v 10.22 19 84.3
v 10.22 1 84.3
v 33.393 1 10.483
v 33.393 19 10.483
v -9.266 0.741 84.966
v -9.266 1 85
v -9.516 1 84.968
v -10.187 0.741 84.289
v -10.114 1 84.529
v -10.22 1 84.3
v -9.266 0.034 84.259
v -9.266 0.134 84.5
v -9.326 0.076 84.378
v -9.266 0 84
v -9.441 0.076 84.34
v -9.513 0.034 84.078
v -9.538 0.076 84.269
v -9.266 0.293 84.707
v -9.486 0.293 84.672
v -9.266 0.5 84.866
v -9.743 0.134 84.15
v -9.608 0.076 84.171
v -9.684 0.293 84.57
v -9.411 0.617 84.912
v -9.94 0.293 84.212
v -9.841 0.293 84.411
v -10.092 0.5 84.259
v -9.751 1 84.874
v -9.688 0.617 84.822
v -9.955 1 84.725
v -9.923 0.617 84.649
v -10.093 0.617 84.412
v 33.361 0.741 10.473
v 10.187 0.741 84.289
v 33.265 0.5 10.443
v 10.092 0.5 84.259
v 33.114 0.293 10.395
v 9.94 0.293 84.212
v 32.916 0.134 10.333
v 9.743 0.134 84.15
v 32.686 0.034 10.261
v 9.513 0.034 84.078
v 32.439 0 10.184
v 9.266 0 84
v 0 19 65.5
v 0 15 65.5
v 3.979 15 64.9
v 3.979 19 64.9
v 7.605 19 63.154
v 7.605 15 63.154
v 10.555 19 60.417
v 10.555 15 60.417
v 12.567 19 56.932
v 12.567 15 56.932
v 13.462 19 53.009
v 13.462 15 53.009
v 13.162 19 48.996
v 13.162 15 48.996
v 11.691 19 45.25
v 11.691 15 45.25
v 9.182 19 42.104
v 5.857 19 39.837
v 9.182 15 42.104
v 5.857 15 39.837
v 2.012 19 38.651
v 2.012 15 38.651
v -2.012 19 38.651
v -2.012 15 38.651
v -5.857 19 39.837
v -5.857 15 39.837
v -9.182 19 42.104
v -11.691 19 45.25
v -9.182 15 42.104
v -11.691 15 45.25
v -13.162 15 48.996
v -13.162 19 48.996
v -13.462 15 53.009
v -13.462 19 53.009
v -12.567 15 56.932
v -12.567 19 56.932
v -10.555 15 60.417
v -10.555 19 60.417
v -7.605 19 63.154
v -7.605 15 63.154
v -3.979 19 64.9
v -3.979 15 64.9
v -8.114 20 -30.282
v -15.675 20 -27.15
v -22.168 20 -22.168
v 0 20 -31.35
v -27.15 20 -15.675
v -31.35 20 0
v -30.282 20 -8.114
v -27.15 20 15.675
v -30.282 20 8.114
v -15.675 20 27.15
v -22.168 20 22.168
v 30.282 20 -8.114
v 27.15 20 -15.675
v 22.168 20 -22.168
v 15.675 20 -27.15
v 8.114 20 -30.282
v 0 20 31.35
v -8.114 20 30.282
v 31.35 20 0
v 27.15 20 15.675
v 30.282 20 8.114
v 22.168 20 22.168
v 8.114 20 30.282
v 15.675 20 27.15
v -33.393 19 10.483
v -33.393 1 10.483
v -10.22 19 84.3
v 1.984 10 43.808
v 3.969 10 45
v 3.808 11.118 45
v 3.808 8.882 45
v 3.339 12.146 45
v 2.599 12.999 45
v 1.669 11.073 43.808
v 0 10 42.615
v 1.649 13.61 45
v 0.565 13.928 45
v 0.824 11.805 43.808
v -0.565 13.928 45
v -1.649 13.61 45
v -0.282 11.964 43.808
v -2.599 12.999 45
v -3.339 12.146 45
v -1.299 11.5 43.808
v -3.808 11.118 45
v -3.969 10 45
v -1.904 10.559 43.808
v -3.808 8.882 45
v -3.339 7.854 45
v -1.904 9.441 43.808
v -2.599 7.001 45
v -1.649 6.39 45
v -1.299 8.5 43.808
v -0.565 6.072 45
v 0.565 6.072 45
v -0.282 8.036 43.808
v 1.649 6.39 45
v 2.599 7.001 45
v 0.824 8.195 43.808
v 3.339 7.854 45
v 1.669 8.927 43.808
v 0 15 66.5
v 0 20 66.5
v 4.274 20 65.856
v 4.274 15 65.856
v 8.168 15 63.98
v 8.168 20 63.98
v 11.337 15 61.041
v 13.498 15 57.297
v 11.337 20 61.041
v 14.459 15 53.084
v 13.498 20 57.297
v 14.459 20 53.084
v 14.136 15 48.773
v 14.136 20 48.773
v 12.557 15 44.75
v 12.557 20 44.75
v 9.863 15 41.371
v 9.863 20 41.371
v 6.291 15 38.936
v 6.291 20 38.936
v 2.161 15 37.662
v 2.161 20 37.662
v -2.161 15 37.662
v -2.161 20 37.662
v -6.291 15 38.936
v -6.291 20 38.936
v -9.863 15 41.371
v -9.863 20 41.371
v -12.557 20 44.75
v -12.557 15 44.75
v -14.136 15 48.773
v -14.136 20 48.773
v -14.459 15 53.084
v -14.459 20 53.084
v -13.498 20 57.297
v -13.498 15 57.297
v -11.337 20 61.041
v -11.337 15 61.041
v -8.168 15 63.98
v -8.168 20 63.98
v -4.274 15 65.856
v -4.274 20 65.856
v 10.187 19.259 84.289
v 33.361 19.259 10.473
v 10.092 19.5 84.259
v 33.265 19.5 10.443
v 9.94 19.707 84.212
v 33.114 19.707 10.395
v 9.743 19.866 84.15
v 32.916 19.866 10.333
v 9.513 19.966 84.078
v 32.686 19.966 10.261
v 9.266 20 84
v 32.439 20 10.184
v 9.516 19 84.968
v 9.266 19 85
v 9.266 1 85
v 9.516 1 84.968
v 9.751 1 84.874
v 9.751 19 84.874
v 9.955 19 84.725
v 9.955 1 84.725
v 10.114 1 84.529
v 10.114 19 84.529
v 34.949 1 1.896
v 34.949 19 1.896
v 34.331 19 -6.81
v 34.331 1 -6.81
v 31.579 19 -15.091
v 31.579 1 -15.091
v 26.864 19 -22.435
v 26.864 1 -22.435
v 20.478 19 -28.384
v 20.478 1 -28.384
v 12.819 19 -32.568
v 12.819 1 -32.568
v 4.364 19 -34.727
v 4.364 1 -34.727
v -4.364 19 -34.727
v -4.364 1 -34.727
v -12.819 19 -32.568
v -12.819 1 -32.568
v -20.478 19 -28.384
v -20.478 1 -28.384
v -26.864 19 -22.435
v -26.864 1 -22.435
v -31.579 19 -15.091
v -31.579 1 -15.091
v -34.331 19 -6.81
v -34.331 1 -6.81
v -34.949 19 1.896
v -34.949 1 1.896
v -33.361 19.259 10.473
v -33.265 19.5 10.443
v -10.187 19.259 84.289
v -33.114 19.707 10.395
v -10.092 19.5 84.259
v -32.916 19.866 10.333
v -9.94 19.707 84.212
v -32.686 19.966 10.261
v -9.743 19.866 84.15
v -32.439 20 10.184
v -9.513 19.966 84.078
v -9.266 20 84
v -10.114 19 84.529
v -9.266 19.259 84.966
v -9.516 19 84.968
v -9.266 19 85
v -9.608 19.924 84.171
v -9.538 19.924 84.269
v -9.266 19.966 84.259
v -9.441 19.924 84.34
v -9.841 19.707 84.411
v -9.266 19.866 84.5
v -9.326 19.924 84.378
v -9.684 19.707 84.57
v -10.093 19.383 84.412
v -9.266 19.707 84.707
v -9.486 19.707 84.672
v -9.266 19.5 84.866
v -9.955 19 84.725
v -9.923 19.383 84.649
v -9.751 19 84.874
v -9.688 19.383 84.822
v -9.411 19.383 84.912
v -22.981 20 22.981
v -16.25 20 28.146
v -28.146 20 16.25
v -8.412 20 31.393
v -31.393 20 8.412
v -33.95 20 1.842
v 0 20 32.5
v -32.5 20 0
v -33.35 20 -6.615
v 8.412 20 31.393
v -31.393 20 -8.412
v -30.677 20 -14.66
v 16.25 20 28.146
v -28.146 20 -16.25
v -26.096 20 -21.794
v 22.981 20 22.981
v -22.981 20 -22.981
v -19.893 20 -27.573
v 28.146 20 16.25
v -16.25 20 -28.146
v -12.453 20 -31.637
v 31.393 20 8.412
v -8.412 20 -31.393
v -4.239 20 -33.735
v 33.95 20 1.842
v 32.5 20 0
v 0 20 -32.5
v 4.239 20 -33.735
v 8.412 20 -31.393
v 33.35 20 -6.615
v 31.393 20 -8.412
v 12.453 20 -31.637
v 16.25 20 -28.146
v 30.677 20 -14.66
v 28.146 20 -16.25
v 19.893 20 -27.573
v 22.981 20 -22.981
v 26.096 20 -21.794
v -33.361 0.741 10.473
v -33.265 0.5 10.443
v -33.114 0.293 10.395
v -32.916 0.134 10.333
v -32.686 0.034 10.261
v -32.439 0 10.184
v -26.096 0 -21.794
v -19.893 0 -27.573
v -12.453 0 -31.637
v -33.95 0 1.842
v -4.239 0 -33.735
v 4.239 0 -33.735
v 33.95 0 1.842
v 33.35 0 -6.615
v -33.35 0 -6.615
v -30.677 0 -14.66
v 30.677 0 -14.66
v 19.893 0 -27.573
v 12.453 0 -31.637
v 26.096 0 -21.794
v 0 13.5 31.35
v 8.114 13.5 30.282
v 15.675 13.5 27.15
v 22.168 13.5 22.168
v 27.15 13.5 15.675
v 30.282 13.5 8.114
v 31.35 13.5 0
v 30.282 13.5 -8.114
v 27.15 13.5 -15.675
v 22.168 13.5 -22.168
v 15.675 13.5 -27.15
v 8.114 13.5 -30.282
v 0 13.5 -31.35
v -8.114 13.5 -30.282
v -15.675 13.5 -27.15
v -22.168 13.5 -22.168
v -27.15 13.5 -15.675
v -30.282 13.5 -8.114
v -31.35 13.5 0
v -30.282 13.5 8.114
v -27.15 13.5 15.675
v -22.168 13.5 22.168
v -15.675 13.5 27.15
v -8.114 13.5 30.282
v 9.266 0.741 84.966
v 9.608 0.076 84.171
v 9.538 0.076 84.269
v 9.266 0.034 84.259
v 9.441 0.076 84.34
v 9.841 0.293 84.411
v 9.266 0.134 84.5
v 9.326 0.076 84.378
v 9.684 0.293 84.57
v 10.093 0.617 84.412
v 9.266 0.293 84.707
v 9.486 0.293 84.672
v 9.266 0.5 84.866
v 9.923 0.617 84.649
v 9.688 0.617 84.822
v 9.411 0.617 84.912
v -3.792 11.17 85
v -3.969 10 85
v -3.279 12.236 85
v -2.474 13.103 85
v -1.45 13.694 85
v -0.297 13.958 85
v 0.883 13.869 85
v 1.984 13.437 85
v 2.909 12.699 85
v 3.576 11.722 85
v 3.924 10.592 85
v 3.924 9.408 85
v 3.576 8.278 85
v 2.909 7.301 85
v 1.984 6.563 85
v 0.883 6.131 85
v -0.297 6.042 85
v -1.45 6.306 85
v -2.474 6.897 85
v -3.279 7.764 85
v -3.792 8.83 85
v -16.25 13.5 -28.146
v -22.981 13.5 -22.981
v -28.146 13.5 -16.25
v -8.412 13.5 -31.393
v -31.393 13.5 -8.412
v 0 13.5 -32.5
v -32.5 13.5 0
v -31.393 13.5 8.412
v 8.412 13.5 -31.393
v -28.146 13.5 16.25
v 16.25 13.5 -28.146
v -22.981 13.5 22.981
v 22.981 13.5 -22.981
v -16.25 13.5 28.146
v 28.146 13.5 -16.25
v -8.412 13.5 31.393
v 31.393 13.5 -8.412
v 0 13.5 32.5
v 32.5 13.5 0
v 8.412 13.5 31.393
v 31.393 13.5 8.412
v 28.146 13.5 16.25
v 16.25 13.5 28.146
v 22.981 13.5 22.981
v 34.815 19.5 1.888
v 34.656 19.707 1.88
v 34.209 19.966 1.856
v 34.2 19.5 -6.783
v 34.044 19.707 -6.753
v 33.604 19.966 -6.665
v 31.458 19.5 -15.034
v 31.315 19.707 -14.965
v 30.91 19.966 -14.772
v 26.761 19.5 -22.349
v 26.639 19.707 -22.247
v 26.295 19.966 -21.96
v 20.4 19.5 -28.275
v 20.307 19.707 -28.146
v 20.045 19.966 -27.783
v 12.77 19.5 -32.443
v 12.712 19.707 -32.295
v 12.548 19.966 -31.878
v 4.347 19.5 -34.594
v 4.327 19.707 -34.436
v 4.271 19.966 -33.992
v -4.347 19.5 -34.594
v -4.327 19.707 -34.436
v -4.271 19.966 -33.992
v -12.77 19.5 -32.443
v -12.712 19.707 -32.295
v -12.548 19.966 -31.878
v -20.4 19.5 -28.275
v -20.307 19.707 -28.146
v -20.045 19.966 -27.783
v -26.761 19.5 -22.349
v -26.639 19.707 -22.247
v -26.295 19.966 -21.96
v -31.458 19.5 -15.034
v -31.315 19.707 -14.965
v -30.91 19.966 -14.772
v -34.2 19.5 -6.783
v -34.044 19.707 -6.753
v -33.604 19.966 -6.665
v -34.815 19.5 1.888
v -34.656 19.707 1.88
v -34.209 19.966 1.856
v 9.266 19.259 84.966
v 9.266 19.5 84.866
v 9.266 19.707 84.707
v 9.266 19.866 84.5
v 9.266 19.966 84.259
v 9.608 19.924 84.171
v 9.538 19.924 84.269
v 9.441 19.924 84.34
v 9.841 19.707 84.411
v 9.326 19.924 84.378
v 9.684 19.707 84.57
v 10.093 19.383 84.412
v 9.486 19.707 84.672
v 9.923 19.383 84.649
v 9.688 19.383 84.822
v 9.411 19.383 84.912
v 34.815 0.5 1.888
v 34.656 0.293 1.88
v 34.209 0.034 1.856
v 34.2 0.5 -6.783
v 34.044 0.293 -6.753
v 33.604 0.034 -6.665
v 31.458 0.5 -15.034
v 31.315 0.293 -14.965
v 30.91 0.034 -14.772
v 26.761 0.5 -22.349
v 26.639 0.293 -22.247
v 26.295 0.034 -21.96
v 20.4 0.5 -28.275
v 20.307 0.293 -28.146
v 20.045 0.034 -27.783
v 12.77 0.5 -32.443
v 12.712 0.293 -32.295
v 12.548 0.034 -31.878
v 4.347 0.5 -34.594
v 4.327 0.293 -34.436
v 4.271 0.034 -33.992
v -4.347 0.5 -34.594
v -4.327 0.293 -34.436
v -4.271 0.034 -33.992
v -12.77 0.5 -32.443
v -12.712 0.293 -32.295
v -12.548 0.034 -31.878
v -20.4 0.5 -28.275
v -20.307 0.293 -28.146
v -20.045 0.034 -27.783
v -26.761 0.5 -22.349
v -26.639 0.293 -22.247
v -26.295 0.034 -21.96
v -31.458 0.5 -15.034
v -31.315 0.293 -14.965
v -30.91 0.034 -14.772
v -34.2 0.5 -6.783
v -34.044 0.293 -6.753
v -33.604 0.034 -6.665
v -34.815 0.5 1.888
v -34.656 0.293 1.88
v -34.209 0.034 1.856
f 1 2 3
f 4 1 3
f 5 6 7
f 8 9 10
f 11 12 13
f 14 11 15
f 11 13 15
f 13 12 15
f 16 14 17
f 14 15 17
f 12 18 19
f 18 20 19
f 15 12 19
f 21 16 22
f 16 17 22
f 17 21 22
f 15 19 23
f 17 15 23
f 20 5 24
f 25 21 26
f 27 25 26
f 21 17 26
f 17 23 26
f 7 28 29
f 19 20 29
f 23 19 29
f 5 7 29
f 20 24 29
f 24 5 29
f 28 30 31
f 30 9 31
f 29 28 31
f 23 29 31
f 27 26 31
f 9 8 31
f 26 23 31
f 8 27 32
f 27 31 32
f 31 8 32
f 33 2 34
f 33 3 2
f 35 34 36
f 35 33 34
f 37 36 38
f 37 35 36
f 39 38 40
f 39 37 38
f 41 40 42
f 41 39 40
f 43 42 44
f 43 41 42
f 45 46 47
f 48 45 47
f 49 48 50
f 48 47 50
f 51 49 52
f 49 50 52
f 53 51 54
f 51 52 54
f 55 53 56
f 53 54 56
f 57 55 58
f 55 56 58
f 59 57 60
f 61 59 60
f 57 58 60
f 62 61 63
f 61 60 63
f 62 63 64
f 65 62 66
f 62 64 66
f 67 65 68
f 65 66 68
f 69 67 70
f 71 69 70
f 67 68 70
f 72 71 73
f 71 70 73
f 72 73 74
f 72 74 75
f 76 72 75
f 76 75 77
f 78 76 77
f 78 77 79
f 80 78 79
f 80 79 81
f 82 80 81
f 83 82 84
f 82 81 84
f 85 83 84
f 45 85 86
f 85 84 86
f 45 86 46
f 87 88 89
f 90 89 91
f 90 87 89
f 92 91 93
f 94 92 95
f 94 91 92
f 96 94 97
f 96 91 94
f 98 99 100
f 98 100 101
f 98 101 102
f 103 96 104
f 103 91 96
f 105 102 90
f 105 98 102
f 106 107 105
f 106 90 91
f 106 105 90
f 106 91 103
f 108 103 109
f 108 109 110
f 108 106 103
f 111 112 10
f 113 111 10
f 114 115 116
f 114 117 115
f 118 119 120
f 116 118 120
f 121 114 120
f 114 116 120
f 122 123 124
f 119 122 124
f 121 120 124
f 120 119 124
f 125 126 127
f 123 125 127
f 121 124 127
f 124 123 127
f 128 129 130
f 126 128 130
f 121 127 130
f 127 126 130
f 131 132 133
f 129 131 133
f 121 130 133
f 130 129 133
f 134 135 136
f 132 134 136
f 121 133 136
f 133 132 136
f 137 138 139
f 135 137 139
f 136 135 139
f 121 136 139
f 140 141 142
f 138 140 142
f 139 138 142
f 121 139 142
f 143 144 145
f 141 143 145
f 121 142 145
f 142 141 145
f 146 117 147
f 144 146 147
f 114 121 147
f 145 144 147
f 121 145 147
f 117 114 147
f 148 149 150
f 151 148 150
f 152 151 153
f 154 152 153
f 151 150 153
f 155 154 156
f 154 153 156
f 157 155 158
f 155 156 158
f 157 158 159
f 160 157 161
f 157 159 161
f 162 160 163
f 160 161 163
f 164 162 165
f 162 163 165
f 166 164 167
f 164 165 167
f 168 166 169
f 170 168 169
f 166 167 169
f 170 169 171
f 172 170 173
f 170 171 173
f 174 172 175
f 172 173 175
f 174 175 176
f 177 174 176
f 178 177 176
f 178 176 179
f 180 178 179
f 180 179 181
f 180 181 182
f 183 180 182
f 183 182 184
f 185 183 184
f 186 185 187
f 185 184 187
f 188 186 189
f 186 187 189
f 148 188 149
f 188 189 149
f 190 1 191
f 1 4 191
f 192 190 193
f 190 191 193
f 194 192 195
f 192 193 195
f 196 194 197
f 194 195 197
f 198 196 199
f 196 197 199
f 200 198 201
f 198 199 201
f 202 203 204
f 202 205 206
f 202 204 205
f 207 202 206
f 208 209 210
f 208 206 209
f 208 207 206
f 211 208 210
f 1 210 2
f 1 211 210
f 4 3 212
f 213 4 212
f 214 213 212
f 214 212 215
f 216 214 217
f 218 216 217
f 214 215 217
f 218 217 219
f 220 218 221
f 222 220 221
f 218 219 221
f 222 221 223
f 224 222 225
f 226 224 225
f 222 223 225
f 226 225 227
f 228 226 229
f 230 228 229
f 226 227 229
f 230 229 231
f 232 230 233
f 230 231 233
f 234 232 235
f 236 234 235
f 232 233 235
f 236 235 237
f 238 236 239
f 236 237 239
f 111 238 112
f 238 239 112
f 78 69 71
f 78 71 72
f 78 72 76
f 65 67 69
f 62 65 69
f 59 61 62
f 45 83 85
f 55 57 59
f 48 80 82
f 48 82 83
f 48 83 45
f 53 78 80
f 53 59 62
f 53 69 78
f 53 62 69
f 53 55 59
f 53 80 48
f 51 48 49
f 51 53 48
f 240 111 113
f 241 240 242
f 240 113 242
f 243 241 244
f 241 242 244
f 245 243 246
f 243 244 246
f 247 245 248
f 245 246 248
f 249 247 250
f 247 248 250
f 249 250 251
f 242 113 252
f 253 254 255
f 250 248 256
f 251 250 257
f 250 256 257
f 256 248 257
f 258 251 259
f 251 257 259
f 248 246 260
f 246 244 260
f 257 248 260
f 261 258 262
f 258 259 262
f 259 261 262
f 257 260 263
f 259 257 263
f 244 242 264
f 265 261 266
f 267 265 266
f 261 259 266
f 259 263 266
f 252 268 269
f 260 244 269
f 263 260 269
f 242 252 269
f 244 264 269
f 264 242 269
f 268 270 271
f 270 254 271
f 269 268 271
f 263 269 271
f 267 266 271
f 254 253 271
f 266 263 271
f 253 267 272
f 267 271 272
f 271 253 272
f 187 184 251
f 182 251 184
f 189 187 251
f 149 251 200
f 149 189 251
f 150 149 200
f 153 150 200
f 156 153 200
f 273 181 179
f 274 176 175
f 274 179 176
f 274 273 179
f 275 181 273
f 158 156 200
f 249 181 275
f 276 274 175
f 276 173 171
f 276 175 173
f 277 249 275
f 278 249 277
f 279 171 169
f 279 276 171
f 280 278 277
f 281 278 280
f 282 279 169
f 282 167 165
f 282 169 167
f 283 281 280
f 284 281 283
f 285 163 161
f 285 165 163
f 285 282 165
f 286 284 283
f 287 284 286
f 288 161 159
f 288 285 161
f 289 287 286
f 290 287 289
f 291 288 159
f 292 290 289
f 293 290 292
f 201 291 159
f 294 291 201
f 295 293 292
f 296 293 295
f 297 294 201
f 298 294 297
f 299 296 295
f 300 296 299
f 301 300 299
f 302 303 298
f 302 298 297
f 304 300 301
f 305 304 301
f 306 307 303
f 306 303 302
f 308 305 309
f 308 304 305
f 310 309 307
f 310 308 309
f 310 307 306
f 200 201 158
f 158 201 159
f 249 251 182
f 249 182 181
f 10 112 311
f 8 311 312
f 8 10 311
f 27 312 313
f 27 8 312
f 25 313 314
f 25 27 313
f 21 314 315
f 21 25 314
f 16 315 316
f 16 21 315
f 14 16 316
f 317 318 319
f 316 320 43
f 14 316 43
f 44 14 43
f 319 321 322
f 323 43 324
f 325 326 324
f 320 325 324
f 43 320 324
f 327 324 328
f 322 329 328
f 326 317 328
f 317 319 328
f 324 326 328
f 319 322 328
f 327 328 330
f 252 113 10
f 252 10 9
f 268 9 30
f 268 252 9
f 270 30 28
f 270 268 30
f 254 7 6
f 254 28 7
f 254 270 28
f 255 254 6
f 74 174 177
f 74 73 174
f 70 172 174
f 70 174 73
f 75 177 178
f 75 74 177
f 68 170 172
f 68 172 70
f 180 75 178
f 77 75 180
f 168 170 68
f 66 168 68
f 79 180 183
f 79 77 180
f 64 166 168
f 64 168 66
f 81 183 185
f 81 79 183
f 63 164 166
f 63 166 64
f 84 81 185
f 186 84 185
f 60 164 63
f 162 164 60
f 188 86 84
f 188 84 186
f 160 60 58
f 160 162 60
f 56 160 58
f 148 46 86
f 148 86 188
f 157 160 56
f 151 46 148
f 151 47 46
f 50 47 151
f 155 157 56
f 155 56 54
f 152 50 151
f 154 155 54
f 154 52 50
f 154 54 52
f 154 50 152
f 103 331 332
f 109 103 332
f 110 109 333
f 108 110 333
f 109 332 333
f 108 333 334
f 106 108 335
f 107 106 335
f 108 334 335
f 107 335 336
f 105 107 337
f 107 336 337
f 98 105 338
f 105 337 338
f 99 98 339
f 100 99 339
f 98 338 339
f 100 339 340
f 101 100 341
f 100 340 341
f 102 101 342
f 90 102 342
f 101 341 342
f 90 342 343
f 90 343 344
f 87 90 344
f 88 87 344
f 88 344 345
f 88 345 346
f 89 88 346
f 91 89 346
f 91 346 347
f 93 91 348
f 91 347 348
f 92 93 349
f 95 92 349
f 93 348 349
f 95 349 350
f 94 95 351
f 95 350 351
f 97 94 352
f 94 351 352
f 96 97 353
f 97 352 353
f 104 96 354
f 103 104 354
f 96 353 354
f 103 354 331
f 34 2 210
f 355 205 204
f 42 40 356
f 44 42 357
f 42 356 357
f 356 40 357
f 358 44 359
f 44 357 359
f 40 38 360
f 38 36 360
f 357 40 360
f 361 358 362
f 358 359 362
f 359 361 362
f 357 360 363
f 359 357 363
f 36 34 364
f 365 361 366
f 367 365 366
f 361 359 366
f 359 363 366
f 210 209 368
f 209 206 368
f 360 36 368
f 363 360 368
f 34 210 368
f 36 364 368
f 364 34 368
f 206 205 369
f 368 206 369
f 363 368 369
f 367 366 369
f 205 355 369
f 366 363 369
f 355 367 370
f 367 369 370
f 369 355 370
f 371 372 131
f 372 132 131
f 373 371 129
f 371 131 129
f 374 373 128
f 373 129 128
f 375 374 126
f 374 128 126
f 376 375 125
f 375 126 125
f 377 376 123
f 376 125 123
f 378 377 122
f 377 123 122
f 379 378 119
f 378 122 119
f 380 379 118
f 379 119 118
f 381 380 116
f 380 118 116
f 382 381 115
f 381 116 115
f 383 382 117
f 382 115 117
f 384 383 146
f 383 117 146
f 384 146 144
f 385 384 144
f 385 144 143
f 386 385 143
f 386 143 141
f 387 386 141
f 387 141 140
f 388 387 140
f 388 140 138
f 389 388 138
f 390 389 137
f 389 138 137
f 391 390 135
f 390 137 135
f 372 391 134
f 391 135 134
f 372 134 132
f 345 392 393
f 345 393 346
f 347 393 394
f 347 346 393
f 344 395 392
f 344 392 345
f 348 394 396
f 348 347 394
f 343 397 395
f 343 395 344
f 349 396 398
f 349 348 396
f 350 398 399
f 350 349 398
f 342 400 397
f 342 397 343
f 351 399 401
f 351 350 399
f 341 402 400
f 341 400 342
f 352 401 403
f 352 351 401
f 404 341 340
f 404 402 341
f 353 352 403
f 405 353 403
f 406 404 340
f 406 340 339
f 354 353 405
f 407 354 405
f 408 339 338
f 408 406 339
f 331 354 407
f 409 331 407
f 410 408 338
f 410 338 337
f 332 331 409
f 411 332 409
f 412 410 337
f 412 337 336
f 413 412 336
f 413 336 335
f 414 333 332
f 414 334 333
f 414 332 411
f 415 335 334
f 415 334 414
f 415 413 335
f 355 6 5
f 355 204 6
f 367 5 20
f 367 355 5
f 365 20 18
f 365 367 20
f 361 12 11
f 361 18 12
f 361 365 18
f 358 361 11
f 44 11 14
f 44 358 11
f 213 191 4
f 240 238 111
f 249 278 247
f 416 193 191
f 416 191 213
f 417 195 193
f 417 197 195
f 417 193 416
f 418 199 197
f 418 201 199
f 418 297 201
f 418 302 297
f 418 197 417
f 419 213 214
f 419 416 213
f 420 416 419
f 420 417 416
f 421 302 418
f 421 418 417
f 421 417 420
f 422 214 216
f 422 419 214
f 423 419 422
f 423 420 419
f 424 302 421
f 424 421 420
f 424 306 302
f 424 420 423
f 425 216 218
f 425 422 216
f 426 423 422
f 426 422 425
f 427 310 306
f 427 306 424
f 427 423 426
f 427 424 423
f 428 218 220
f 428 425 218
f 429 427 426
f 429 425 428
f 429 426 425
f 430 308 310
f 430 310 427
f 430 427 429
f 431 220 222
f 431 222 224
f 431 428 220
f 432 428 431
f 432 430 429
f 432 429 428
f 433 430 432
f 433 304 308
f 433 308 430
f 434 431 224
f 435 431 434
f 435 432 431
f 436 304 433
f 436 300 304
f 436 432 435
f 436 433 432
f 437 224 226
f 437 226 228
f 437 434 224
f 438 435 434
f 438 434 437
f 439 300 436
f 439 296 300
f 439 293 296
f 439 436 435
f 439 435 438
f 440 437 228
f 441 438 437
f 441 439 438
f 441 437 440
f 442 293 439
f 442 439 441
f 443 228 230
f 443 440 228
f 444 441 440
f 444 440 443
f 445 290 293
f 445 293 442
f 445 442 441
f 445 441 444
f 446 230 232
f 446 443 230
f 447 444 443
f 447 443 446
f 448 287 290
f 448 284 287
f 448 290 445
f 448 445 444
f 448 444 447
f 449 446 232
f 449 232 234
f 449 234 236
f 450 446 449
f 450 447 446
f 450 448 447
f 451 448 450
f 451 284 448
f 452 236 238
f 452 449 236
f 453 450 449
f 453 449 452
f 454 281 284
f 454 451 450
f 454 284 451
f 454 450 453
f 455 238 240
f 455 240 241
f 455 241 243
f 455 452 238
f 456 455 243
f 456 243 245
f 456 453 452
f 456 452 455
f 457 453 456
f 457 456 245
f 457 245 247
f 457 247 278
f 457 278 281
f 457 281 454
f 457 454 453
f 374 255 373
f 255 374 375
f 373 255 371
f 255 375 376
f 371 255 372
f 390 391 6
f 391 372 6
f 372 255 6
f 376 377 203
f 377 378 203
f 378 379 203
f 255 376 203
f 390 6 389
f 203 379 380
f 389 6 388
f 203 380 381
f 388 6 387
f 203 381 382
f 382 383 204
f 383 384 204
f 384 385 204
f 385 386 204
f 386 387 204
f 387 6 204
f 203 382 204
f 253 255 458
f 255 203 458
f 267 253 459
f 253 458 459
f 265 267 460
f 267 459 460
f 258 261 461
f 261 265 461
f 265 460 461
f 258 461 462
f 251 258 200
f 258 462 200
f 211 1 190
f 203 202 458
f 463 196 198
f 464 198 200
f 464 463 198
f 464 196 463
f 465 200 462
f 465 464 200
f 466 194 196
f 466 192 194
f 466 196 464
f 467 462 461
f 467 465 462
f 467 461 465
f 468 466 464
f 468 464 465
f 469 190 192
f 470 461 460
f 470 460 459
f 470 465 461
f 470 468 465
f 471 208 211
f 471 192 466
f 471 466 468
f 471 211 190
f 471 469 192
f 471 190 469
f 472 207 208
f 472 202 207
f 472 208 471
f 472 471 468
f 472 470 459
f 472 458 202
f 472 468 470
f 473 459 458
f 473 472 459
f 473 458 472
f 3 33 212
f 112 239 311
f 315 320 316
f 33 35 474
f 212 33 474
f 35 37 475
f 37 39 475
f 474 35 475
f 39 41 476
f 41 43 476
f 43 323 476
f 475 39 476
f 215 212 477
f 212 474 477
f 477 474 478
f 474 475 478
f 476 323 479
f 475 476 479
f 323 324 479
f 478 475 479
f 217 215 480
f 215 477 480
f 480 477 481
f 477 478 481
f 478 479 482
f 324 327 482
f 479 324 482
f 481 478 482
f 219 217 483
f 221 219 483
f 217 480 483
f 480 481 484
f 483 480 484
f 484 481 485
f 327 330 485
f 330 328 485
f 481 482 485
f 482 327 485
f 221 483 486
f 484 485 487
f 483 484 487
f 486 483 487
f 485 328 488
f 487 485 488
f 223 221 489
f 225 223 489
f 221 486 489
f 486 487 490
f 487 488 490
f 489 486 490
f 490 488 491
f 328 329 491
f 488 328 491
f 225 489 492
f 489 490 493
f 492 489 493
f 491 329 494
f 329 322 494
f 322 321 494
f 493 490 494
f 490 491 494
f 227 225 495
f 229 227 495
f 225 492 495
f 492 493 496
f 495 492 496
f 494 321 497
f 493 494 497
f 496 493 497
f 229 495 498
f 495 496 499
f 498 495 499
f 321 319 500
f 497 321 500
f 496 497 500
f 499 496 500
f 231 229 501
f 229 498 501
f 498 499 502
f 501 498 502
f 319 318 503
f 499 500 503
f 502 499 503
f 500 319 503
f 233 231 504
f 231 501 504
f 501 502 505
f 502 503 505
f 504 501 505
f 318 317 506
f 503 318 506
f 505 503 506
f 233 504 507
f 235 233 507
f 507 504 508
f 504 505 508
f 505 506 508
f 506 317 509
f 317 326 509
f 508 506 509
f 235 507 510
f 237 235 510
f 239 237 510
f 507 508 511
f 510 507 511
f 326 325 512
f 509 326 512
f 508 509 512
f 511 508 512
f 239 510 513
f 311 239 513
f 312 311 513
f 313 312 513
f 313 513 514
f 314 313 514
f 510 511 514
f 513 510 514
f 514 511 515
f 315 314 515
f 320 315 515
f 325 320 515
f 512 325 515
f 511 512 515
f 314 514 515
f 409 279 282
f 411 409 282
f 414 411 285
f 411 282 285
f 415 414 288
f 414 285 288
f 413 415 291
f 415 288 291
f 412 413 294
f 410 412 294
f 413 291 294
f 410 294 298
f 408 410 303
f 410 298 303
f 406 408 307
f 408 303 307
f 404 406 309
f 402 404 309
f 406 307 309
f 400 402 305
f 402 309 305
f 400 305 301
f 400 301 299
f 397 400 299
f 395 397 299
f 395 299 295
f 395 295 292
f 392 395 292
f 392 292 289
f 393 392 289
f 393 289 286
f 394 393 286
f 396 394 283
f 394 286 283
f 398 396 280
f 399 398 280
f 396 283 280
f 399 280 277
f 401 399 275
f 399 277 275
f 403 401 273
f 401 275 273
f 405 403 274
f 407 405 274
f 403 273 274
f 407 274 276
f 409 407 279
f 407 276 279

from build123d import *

# Parameters (mm, degrees)
SKETCH1_R                       = 35
BOSS_EXTRUDE1_DEPTH             = 20
SKETCH2_R                       = 32.5
CUT_EXTRUDE1_DEPTH              = 6.5
SKETCH3_R                       = 31.35
BOSS_EXTRUDE2_DEPTH             = 6.5
BOSS_EXTRUDE3_DEPTH             = 20
SKETCH14_R                      = 14.5
CUT_EXTRUDE2_DEPTH              = 5
SKETCH15_R                      = 13.5
BOSS_EXTRUDE4_DEPTH             = 4
TAP_DRILL_FOR_3_8_16_TAP1_D     = 7.9375
TAP_DRILL_FOR_3_8_16_TAP1_DEPTH = 40
TAP_DRILL_FOR_3_8_16_TAP1_TIP   = 2.384665582
FILLET1_R                       = 1


with BuildPart() as part:
    # Sketch1 → Boss-Extrude1 (new body)
    with BuildSketch(Plane(origin=(0, 0, 0), x_dir=(1, 0, 0), z_dir=(0, 1, 0))):
        with Locations(Location((0, 0, 0), (0, 0, 270))):
            Circle(SKETCH1_R)
    extrude(amount=BOSS_EXTRUDE1_DEPTH)

    # Sketch2 → Cut-Extrude1 (cut)
    with BuildSketch(Plane(origin=(0, 20, 0), x_dir=(1, 0, 0), z_dir=(0, 1, 0))):
        with Locations(Location((0, 0, 0), (0, 0, 270))):
            Circle(SKETCH2_R)
    extrude(amount=-CUT_EXTRUDE1_DEPTH, mode=Mode.SUBTRACT)

    # Sketch3 → Boss-Extrude2 (add)
    with BuildSketch(Plane(origin=(0, 13.5, 0), x_dir=(1, 0, 0), z_dir=(0, 1, 0))):
        with Locations(Location((0, 0, 0), (0, 0, 270))):
            Circle(SKETCH3_R)
    extrude(amount=BOSS_EXTRUDE2_DEPTH)

    # Sketch8 → Boss-Extrude3 (add)
    with BuildSketch(Plane(origin=(0, 0, 0), x_dir=(1, 0, 0), z_dir=(0, 1, 0))):
        with BuildLine():
            ThreePointArc((33.393164213, -10.483157151), (0, -35), (-33.393164213, -10.483157151))
            Line((-33.393164213, -10.483157151), (-10, -85))
            Line((-10, -85), (10, -85))
            Line((10, -85), (33.393164213, -10.483157151))
        make_face()
    extrude(amount=BOSS_EXTRUDE3_DEPTH)

    # Sketch14 → Cut-Extrude2 (cut)
    with BuildSketch(Plane(origin=(0, 20, 0), x_dir=(1, 0, 0), z_dir=(0, 1, 0))):
        with Locations(Location((0, -52, 0), (0, 0, 270))):
            Circle(SKETCH14_R)
    extrude(amount=-CUT_EXTRUDE2_DEPTH, mode=Mode.SUBTRACT)

    # Sketch15 → Boss-Extrude4 (add)
    with BuildSketch(Plane(origin=(0, 15, 0), x_dir=(1, 0, 0), z_dir=(0, 1, 0))):
        with Locations(Location((0, -52, 0), (0, 0, 270))):
            Circle(SKETCH15_R)
    extrude(amount=BOSS_EXTRUDE4_DEPTH)

    # Tap Drill for 3/8-16 Tap1
    with Locations(Plane.XY.offset(85)):
        with Locations((0, 10)):
            Hole(TAP_DRILL_FOR_3_8_16_TAP1_D / 2, depth=TAP_DRILL_FOR_3_8_16_TAP1_DEPTH)
            with Locations((0, 0, -(TAP_DRILL_FOR_3_8_16_TAP1_DEPTH + TAP_DRILL_FOR_3_8_16_TAP1_TIP / 2))):  # 118° drill point
                Cone(0, TAP_DRILL_FOR_3_8_16_TAP1_D / 2, TAP_DRILL_FOR_3_8_16_TAP1_TIP, mode=Mode.SUBTRACT)

    # Fillet1
    fillet1_edges = [part.edges().sort_by_distance(p)[0] for p in [
        (0, 0, -35),
        (-21.696582106, 0, 47.741578576),
        (-10, 10, 85),
        (0, 0, 85),
        (10, 10, 85),
        (21.696582106, 0, 47.741578576),
        (-21.696582106, 20, 47.741578576),
        (0, 20, 85),
        (21.696582106, 20, 47.741578576),
        (0, 20, -35),
    ]]
    fillet(fillet1_edges, radius=FILLET1_R)


solid = part.part
